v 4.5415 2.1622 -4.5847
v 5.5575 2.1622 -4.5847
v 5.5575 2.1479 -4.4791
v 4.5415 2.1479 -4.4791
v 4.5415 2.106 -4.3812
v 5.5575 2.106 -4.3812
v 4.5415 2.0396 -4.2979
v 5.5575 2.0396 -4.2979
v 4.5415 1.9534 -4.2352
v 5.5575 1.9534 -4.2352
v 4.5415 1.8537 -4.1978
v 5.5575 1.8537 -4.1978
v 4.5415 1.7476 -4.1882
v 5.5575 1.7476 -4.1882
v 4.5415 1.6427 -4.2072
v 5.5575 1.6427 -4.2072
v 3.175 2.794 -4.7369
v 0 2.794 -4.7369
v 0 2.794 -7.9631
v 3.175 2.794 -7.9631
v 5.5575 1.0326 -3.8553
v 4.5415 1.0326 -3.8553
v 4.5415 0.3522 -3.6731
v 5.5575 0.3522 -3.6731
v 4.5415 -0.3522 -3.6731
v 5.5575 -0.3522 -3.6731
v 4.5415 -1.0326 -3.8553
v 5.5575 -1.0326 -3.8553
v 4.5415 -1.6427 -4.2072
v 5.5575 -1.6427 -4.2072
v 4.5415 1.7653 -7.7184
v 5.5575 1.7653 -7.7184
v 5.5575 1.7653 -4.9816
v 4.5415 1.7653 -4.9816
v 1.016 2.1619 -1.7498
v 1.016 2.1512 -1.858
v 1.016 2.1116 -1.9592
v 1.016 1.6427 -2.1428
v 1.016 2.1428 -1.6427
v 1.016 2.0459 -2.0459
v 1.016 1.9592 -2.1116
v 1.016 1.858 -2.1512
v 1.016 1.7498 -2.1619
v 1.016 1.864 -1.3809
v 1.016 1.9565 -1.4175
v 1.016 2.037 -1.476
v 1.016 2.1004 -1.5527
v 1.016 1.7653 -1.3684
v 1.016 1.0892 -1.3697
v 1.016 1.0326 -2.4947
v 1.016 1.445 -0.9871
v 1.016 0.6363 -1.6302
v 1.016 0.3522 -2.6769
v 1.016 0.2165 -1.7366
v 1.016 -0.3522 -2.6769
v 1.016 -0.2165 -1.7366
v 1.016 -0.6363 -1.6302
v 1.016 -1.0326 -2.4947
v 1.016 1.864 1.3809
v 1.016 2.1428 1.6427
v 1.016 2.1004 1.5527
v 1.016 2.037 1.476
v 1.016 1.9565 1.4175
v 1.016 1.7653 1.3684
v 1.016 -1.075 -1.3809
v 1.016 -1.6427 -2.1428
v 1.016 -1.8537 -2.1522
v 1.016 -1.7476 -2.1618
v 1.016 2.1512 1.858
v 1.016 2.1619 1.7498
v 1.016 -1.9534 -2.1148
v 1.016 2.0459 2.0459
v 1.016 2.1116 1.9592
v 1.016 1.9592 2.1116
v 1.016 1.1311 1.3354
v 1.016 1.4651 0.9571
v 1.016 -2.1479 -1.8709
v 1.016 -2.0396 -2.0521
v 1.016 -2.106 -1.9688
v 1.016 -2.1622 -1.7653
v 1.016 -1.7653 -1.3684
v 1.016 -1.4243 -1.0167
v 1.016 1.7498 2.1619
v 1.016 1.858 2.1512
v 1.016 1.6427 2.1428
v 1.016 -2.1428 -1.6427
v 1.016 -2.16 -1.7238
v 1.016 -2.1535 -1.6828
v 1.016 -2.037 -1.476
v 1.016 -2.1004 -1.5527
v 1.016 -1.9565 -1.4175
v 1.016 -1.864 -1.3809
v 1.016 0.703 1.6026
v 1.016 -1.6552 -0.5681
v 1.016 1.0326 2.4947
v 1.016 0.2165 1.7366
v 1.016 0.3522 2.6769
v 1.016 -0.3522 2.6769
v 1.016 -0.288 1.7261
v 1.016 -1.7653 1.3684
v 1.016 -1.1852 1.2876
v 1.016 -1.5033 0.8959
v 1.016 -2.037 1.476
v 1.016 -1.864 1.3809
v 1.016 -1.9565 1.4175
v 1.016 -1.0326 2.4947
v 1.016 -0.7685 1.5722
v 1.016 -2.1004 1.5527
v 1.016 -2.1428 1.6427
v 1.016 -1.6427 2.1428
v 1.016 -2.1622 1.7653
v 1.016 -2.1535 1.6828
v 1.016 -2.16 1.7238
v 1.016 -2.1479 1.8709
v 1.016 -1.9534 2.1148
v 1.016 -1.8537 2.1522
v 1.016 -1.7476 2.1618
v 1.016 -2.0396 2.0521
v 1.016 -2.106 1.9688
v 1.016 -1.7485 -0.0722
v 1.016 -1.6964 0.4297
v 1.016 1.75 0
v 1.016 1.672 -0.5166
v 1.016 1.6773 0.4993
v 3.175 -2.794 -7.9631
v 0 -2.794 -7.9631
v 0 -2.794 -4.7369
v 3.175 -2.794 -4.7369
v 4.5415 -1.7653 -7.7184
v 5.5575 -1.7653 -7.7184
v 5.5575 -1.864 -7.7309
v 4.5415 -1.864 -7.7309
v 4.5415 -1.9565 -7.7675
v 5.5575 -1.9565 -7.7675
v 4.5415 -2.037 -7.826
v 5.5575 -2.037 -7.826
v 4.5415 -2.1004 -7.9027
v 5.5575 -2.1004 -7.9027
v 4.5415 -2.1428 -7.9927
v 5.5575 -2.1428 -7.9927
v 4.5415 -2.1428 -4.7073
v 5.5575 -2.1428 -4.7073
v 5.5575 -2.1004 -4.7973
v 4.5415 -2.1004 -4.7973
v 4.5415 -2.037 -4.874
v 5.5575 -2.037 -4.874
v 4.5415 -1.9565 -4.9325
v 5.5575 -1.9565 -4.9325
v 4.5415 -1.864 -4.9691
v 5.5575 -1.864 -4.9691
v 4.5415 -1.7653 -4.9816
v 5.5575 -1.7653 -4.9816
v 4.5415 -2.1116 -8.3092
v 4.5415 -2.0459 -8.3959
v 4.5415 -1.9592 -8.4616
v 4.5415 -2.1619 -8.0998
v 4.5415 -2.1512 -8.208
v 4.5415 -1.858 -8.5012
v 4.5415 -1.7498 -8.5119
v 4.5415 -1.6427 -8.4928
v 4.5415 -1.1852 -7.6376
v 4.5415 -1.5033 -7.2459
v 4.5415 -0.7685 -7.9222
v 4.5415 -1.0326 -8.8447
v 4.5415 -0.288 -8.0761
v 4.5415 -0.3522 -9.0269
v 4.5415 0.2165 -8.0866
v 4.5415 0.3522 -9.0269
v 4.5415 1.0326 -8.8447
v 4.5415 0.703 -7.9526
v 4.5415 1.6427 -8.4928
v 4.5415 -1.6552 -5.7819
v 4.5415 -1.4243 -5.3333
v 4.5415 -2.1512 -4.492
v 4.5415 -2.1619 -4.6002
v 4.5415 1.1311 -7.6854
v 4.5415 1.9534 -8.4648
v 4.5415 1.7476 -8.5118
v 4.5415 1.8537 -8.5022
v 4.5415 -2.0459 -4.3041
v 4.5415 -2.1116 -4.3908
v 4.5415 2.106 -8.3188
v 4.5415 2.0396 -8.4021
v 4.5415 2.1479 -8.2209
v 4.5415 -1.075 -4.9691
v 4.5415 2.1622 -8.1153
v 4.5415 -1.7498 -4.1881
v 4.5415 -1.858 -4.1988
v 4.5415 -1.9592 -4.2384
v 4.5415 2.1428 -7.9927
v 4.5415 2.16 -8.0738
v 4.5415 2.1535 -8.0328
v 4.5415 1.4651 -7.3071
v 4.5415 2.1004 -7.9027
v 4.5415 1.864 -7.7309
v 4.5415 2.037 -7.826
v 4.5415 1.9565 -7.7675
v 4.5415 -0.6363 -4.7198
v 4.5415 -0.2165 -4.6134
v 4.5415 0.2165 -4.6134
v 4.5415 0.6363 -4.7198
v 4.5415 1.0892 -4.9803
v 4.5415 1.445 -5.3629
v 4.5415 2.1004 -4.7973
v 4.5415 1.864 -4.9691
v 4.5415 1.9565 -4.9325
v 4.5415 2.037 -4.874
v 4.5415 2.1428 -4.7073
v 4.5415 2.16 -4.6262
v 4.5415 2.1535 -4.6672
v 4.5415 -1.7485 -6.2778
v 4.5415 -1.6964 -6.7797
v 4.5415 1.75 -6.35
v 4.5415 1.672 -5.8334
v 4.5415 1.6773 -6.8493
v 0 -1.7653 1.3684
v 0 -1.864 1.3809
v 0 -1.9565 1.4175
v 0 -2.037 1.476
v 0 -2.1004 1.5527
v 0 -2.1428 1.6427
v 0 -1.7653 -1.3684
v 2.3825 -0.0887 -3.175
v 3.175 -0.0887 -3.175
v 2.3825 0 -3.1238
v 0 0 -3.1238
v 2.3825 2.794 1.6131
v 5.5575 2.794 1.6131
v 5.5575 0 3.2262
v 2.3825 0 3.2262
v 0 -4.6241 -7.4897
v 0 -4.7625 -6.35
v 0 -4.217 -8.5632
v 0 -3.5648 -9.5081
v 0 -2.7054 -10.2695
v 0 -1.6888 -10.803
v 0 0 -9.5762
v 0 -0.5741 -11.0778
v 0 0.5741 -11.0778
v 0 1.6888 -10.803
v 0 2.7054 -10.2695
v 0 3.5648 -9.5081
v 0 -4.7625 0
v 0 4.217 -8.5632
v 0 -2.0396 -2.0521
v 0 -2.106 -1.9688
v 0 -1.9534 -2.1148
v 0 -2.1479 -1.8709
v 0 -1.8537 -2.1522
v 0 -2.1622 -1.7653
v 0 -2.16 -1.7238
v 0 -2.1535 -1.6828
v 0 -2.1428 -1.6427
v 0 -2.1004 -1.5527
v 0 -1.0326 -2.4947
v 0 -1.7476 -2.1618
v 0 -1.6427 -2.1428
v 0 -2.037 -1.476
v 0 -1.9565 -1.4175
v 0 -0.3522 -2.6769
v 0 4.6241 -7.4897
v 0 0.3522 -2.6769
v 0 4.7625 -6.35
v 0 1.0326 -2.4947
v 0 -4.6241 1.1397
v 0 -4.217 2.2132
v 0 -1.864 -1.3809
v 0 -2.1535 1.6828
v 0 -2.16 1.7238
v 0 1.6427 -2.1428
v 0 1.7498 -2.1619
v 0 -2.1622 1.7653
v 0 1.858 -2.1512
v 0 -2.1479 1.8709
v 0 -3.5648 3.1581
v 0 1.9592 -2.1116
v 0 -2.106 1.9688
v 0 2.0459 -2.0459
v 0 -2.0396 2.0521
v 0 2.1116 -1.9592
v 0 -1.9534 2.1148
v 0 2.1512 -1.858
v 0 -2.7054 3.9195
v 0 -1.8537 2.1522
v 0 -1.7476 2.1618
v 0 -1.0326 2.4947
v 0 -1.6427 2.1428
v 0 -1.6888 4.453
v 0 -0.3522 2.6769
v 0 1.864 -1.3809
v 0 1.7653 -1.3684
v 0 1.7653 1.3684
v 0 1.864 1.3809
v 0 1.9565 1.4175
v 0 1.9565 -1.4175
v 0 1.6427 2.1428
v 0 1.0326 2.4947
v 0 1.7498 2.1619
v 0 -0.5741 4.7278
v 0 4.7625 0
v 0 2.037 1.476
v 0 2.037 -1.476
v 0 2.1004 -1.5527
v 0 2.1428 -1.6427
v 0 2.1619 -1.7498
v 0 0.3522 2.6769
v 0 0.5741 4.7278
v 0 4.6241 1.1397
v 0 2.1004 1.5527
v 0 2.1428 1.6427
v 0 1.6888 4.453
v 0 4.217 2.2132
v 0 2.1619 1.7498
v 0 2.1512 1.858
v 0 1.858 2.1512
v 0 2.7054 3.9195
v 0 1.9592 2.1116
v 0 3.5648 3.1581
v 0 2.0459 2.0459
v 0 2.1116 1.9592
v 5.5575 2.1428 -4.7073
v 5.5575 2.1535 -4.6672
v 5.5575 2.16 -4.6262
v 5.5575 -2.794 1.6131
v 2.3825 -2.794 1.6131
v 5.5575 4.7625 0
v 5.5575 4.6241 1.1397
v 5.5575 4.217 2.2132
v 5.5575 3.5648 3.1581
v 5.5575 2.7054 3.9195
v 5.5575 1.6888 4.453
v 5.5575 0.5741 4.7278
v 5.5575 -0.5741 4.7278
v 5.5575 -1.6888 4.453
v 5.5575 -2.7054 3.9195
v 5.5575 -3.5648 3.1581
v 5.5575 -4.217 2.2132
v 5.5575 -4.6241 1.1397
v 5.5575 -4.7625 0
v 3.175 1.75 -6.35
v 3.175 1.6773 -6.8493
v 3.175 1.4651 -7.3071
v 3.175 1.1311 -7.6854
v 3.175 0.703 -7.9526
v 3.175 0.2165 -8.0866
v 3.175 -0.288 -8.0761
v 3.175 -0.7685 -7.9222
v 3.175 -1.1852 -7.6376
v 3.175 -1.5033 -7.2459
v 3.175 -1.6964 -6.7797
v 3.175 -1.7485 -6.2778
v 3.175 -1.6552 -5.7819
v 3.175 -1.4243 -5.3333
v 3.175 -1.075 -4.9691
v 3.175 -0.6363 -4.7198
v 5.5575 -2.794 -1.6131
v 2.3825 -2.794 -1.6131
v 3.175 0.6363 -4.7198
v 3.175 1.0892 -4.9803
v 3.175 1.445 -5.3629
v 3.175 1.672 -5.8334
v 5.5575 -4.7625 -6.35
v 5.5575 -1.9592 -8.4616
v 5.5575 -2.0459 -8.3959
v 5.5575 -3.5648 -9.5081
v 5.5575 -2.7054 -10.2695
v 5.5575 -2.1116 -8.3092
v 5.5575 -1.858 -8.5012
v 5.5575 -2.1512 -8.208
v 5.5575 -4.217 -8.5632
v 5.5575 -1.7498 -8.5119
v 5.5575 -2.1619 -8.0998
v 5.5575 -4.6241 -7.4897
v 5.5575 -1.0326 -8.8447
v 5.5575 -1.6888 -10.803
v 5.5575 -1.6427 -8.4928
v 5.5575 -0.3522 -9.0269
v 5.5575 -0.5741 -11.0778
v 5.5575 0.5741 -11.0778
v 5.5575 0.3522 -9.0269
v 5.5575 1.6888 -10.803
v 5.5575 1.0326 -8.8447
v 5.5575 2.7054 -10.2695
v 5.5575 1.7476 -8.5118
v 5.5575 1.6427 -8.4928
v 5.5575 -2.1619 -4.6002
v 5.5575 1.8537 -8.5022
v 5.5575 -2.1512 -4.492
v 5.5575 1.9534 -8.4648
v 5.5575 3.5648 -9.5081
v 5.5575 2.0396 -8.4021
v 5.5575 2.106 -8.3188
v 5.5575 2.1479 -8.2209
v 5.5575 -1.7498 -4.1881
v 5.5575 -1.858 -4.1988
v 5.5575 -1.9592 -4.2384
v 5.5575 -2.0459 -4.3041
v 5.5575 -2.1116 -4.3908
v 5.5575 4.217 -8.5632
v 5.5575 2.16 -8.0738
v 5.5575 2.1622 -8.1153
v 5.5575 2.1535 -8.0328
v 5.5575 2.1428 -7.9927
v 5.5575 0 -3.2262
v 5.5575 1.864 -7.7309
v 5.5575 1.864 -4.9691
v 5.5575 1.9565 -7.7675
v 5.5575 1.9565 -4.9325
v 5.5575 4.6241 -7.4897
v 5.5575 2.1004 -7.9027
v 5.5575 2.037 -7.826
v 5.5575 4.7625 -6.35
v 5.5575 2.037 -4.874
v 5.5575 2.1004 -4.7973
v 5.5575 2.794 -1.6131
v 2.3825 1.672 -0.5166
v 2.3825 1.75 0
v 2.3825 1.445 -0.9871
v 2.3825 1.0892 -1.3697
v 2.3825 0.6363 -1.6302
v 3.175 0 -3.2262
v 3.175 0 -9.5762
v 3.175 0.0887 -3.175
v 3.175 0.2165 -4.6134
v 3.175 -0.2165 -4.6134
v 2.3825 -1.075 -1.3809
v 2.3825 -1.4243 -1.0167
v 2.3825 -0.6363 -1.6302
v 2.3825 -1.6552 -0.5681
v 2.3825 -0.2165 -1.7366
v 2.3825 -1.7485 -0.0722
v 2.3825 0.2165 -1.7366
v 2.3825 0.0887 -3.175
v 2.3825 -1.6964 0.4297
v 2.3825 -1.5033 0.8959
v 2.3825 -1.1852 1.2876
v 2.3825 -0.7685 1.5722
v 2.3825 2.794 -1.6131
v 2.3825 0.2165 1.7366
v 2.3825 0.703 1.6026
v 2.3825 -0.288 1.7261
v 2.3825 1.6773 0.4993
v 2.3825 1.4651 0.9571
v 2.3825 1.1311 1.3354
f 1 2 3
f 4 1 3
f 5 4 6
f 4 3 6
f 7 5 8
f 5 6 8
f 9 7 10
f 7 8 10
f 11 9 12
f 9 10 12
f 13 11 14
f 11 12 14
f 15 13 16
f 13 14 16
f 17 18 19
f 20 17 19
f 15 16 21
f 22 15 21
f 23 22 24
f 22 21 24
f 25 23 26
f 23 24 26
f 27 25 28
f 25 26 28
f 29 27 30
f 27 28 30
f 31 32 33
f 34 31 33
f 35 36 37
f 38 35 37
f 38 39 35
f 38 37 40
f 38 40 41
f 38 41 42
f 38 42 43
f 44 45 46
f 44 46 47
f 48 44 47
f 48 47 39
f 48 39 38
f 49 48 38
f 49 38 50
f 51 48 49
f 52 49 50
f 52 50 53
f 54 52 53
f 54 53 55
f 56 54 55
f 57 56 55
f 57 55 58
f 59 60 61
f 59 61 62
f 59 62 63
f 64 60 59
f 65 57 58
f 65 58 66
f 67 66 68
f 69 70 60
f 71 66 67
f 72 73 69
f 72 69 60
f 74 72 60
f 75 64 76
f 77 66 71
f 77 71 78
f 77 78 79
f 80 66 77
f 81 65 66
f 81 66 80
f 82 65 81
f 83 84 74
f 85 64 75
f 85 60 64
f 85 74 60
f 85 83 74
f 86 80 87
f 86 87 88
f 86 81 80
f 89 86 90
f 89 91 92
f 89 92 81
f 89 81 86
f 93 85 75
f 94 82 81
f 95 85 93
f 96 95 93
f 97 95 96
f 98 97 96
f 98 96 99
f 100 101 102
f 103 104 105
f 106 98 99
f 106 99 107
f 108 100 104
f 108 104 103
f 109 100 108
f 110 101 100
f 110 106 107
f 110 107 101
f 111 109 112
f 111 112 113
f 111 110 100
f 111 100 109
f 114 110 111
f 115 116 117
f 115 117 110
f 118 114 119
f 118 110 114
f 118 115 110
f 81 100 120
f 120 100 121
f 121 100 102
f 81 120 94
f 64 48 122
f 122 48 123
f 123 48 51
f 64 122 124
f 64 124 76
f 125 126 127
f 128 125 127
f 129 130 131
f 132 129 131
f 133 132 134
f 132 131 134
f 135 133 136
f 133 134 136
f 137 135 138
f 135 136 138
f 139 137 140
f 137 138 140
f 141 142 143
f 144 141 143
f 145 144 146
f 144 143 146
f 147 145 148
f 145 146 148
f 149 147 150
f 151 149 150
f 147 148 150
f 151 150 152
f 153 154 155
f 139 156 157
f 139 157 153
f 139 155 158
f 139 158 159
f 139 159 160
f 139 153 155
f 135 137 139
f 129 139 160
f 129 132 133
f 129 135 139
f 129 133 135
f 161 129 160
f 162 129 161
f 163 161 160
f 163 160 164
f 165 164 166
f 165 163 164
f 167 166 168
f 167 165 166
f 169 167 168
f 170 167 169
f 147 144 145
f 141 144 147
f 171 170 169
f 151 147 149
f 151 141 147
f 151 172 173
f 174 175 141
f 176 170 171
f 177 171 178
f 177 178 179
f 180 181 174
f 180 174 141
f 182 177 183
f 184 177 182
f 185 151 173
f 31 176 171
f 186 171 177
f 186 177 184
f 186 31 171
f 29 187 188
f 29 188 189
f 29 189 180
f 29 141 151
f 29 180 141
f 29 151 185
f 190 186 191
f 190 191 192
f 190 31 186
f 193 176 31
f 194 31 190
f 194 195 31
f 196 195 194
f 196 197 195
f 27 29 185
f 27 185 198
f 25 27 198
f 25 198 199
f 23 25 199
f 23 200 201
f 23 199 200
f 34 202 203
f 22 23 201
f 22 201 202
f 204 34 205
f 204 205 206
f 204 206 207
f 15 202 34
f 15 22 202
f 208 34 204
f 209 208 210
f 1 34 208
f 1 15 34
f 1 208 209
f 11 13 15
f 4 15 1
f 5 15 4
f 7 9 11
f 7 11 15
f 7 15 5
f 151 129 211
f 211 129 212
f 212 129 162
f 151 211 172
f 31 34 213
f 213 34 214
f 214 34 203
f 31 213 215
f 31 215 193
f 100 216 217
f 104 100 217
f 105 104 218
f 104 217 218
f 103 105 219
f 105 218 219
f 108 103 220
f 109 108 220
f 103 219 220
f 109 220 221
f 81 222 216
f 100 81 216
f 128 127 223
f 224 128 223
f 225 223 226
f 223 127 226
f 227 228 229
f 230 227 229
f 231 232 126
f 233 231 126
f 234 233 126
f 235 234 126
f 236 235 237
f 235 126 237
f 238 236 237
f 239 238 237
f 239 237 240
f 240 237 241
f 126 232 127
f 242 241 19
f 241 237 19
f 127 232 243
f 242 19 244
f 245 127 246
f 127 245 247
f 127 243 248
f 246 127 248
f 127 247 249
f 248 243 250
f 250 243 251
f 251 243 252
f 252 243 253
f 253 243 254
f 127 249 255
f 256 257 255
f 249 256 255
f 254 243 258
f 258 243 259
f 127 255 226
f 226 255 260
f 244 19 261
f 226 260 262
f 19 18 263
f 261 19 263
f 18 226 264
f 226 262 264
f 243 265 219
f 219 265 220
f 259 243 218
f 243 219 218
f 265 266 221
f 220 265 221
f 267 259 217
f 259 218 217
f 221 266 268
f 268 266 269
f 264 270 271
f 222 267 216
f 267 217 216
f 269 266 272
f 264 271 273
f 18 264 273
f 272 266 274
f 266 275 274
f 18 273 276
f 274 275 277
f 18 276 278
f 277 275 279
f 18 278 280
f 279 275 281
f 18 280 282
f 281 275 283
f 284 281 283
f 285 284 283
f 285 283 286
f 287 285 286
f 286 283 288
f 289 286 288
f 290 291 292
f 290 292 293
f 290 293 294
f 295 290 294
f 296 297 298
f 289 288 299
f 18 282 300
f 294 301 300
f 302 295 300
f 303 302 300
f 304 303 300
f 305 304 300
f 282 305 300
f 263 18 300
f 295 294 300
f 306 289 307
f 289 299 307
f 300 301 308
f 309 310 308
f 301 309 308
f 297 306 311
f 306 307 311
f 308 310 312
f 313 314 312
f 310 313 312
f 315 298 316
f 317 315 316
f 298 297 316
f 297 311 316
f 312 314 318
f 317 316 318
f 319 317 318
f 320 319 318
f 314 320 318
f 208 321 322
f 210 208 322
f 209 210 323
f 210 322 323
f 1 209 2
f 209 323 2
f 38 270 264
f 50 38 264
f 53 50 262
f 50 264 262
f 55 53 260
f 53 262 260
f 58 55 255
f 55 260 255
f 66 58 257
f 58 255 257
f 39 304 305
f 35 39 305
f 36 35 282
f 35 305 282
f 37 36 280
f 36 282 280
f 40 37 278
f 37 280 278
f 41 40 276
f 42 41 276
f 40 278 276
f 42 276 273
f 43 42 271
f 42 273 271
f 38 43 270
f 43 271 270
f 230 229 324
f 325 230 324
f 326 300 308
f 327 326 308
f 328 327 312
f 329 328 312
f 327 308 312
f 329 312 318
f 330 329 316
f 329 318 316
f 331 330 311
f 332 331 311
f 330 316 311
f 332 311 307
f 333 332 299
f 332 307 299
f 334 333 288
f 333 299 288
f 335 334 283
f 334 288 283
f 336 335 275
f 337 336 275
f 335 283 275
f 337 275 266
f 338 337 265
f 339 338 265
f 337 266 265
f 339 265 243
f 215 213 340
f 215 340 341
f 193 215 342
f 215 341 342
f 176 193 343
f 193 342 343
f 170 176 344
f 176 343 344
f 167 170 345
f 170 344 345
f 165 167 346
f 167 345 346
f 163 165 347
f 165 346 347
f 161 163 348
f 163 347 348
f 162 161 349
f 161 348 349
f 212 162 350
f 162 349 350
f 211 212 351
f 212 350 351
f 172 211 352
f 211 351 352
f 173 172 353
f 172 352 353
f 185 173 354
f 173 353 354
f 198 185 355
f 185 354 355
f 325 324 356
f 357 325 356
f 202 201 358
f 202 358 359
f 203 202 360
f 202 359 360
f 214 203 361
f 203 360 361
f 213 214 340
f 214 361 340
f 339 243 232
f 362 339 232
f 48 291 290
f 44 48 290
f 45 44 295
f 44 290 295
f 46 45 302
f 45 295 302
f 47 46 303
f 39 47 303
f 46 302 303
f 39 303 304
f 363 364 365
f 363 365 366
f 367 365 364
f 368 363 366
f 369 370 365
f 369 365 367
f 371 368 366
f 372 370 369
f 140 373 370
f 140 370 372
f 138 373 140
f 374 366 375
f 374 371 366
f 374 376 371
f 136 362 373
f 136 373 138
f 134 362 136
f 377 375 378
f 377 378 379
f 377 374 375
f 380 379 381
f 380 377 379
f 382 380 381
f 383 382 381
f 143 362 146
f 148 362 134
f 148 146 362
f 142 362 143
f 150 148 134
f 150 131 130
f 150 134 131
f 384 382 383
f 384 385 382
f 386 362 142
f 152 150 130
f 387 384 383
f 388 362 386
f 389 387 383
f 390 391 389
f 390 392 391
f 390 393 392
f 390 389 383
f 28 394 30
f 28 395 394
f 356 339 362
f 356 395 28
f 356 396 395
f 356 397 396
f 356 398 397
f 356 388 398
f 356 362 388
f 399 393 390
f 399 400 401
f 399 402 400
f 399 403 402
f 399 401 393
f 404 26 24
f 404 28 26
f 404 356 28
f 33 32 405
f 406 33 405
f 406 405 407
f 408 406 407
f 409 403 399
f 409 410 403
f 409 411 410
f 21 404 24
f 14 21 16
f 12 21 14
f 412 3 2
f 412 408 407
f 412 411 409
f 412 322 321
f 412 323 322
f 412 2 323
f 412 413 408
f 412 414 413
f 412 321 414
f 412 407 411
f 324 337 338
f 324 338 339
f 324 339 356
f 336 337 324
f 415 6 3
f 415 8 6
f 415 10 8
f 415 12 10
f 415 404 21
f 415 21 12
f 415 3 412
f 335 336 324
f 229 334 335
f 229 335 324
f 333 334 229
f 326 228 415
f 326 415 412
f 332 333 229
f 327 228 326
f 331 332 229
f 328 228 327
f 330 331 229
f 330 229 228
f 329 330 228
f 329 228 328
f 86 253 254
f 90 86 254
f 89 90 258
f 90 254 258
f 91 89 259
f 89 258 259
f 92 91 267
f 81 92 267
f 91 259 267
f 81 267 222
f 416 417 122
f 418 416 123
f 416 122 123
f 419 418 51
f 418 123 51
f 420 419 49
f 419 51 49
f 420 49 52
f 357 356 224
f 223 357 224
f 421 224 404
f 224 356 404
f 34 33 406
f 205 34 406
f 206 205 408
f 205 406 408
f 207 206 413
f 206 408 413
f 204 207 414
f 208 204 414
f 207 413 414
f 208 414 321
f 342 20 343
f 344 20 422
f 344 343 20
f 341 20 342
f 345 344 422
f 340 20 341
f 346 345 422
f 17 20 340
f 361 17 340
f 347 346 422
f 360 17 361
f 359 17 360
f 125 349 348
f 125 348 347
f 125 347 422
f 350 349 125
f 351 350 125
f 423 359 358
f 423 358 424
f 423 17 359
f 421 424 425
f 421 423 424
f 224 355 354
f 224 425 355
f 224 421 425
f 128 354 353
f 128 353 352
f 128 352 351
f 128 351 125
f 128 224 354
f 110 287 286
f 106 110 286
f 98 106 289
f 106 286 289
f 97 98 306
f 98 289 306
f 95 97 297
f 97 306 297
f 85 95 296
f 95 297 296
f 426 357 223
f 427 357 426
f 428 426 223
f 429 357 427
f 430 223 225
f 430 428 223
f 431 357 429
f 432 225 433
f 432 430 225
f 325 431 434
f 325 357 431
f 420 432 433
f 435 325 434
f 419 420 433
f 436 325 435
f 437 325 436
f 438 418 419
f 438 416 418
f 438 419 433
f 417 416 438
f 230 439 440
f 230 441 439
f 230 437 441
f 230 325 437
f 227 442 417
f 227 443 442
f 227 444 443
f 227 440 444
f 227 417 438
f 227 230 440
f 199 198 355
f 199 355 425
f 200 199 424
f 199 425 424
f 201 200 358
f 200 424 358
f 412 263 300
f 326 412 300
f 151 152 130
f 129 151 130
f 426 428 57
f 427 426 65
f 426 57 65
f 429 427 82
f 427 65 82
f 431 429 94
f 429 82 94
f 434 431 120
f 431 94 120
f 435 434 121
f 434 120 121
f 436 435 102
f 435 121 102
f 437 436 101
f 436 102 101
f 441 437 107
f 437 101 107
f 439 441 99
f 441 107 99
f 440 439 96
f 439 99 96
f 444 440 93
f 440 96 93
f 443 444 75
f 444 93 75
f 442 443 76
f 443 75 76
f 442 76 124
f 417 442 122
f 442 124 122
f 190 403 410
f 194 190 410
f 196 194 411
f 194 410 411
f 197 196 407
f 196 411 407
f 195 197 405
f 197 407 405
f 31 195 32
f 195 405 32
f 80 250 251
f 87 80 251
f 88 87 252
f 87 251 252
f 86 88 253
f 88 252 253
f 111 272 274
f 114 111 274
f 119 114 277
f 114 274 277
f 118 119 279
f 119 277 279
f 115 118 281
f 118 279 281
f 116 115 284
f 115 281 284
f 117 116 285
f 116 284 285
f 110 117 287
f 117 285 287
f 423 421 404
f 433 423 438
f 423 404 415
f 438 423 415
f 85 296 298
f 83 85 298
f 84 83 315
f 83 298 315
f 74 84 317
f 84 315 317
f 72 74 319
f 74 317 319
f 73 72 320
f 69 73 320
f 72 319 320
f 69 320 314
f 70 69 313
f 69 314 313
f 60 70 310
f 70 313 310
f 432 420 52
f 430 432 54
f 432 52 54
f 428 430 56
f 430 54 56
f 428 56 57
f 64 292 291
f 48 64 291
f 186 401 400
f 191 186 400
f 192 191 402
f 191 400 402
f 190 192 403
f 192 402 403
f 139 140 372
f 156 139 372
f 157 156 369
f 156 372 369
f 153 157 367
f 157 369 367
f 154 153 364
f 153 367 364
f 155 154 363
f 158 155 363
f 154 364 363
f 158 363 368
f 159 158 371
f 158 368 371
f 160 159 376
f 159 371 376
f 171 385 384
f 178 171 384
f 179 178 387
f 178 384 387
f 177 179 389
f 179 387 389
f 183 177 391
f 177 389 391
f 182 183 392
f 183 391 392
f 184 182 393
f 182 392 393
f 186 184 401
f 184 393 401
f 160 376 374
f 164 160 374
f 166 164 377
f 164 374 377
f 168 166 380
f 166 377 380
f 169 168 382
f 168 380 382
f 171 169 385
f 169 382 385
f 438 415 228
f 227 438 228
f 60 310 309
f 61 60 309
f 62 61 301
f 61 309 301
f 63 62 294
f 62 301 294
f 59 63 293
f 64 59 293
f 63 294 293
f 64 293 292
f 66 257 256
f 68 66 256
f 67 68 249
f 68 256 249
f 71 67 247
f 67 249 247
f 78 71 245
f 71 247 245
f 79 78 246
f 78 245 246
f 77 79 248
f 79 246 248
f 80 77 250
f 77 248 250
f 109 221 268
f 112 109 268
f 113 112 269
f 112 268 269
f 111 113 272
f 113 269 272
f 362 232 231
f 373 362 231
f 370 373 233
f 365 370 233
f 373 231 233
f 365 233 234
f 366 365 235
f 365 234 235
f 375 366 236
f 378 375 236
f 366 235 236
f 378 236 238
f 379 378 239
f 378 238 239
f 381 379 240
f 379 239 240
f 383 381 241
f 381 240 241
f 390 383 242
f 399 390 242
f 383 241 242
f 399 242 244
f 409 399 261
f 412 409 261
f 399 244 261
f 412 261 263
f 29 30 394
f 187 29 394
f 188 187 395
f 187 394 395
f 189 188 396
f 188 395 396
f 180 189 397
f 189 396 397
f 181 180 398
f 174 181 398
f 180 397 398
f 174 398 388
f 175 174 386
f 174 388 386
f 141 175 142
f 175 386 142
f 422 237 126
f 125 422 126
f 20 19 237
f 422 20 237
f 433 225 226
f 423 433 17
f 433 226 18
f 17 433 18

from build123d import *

# Parameters (mm, degrees)
F1_DEPTH = 5.55752
F2_R     = 1.75
F3_DEPTH = 1.016
F4_R     = 1.75
F5_DEPTH = 1.016
F6_DEPTH = 3.175
F7_DEPTH = 3.175


# Not quite as in the source:
# - a feature names something its author has since deleted; it is built from what else it names


with BuildPart() as f1:
    # F0 (on Right) → F1 (new body)
    with BuildSketch(Plane.YZ):
        with BuildLine():
            ThreePointArc((0.636344373, -4.7197957677), (2.2310225415, -4.2076055743), (3.5497579143, -3.175))
            ThreePointArc((3.5497579143, -3.175), (2.2310225415, -2.1423944257), (0.636344373, -1.6302042323))
            ThreePointArc((0.636344373, -1.6302042323), (0, -1.75), (-0.636344373, -1.6302042323))
            ThreePointArc((-0.636344373, -1.6302042323), (-2.2310225415, -2.1423944257), (-3.5497579143, -3.175))
            ThreePointArc((-3.5497579143, -3.175), (-2.2310225415, -4.2076055743), (-0.636344373, -4.7197957677))
            ThreePointArc((-0.636344373, -4.7197957677), (0, -4.6), (0.636344373, -4.7197957677))
        make_face()
        with BuildLine():
            ThreePointArc((3.5497579143, -3.175), (4.4489958596, -1.6993652025), (4.7625, 0))
            ThreePointArc((4.7625, 0), (0, 4.7625), (-4.7625, 0))
            ThreePointArc((-4.7625, 0), (-4.4489958596, -1.6993652025), (-3.5497579143, -3.175))
            ThreePointArc((-3.5497579143, -3.175), (-2.2310225415, -2.1423944257), (-0.636344373, -1.6302042323))
            ThreePointArc((-0.636344373, -1.6302042323), (-0.9871416685, 1.4450091094), (1.75, 0))
            ThreePointArc((1.75, 0), (1.4450091094, -0.9871416685), (0.636344373, -1.6302042323))
            ThreePointArc((0.636344373, -1.6302042323), (2.2310225415, -2.1423944257), (3.5497579143, -3.175))
        make_face()
        with BuildLine():
            Line((4.7625, -6.35), (4.7625, 0))
            ThreePointArc((4.7625, 0), (4.4489958596, -1.6993652025), (3.5497579143, -3.175))
            ThreePointArc((3.5497579143, -3.175), (4.4489958596, -4.6506347975), (4.7625, -6.35))
        make_face()
        with BuildLine():
            ThreePointArc((4.7625, -6.35), (4.4489958596, -4.6506347975), (3.5497579143, -3.175))
            ThreePointArc((3.5497579143, -3.175), (2.2310225415, -4.2076055743), (0.636344373, -4.7197957677))
            ThreePointArc((0.636344373, -4.7197957677), (1.4450091094, -5.3628583315), (1.75, -6.35))
            ThreePointArc((1.75, -6.35), (-0.9871416685, -7.7950091094), (-0.636344373, -4.7197957677))
            ThreePointArc((-0.636344373, -4.7197957677), (-2.2310225415, -4.2076055743), (-3.5497579143, -3.175))
            ThreePointArc((-3.5497579143, -3.175), (-4.4489958596, -4.6506347975), (-4.7625, -6.35))
            ThreePointArc((-4.7625, -6.35), (0, -11.1125), (4.7625, -6.35))
        make_face()
        with BuildLine():
            ThreePointArc((-3.5497579143, -3.175), (-4.4489958596, -1.6993652025), (-4.7625, 0))
            Line((-4.7625, 0), (-4.7625, -6.35))
            ThreePointArc((-4.7625, -6.35), (-4.4489958596, -4.6506347975), (-3.5497579143, -3.175))
        make_face()
    extrude(amount=F1_DEPTH)

    # F2 (on face) → F3 (cut)
    with BuildSketch(Plane.YZ.offset(5.55752)):
        with BuildLine():
            ThreePointArc((1.368425, -4.5847), (1.4846669962, -4.8653330038), (1.7653, -4.981575))
            Line((1.7653, -4.981575), (1.7653, -4.5847))
            Line((1.7653, -4.5847), (1.368425, -4.5847))
        make_face()
        with BuildLine():
            Line((1.7653, -4.5847), (1.7653, -4.981575))
            ThreePointArc((1.7653, -4.981575), (1.9986038099, -4.9057593371), (2.1427708235, -4.7072787218))
            ThreePointArc((2.1427708235, -4.7072787218), (1.9091883092, -4.4408116908), (1.6427212782, -4.2072291765))
            ThreePointArc((1.6427212782, -4.2072291765), (1.4442406629, -4.3513961901), (1.368425, -4.5847))
            Line((1.368425, -4.5847), (1.7653, -4.5847))
        make_face()
        with BuildLine():
            ThreePointArc((1.7653, -7.718425), (1.4846669962, -7.8346669962), (1.368425, -8.1153))
            Line((1.368425, -8.1153), (1.7653, -8.1153))
            Line((1.7653, -8.1153), (1.7653, -7.718425))
        make_face()
        with BuildLine():
            Line((1.7653, -8.1153), (1.368425, -8.1153))
            ThreePointArc((1.368425, -8.1153), (1.4442406629, -8.3486038099), (1.6427212782, -8.4927708235))
            ThreePointArc((1.6427212782, -8.4927708235), (1.9091883092, -8.2591883092), (2.1427708235, -7.9927212782))
            ThreePointArc((2.1427708235, -7.9927212782), (1.9986038099, -7.7942406629), (1.7653, -7.718425))
            Line((1.7653, -7.718425), (1.7653, -8.1153))
        make_face()
        with BuildLine():
            Line((-1.368425, -8.1153), (-1.7653, -8.1153))
            Line((-1.7653, -8.1153), (-1.7653, -7.718425))
            ThreePointArc((-1.7653, -7.718425), (-1.9986038099, -7.7942406629), (-2.1427708235, -7.9927212782))
            ThreePointArc((-2.1427708235, -7.9927212782), (-1.9091883092, -8.2591883092), (-1.6427212782, -8.4927708235))
            ThreePointArc((-1.6427212782, -8.4927708235), (-1.4442406629, -8.3486038099), (-1.368425, -8.1153))
        make_face()
        with BuildLine():
            Line((-1.7653, -7.718425), (-1.7653, -8.1153))
            Line((-1.7653, -8.1153), (-1.368425, -8.1153))
            ThreePointArc((-1.368425, -8.1153), (-1.4846669962, -7.8346669962), (-1.7653, -7.718425))
        make_face()
        with BuildLine():
            Line((-1.7653, -4.5847), (-1.7653, -4.981575))
            ThreePointArc((-1.7653, -4.981575), (-1.4846669962, -4.8653330038), (-1.368425, -4.5847))
            Line((-1.368425, -4.5847), (-1.7653, -4.5847))
        make_face()
        with BuildLine():
            ThreePointArc((-2.1427708235, -4.7072787218), (-1.9986038099, -4.9057593371), (-1.7653, -4.981575))
            Line((-1.7653, -4.981575), (-1.7653, -4.5847))
            Line((-1.7653, -4.5847), (-1.368425, -4.5847))
            ThreePointArc((-1.368425, -4.5847), (-1.4442406629, -4.3513961901), (-1.6427212782, -4.2072291765))
            ThreePointArc((-1.6427212782, -4.2072291765), (-1.9091883092, -4.4408116908), (-2.1427708235, -4.7072787218))
        make_face()
        with BuildLine():
            ThreePointArc((-1.7653, -7.718425), (-1.4846669962, -7.8346669962), (-1.368425, -8.1153))
            Line((-1.368425, -8.1153), (1.368425, -8.1153))
            ThreePointArc((1.368425, -8.1153), (1.4846669962, -7.8346669962), (1.7653, -7.718425))
            Line((1.7653, -7.718425), (1.7653, -4.981575))
            ThreePointArc((1.7653, -4.981575), (1.4846669962, -4.8653330038), (1.368425, -4.5847))
            Line((1.368425, -4.5847), (-1.368425, -4.5847))
            ThreePointArc((-1.368425, -4.5847), (-1.4846669962, -4.8653330038), (-1.7653, -4.981575))
            Line((-1.7653, -4.981575), (-1.7653, -7.718425))
        make_face()
        with Locations((0, -6.35)):
            Circle(F2_R, mode=Mode.SUBTRACT)
        with BuildLine():
            ThreePointArc((-1.6427212782, -4.2072291765), (-2.0459330038, -4.3040669962), (-2.1427708235, -4.7072787218))
            ThreePointArc((-2.1427708235, -4.7072787218), (-1.9091883092, -4.4408116908), (-1.6427212782, -4.2072291765))
        make_face()
        with BuildLine():
            ThreePointArc((1.6427212782, -4.2072291765), (1.9091883092, -4.4408116908), (2.1427708235, -4.7072787218))
            ThreePointArc((2.1427708235, -4.7072787218), (2.1572939405, -4.6467525283), (2.162175, -4.5847))
            ThreePointArc((2.162175, -4.5847), (1.9986038099, -4.2636406629), (1.6427212782, -4.2072291765))
        make_face()
        with BuildLine():
            ThreePointArc((2.1427708235, -7.9927212782), (1.9091883092, -8.2591883092), (1.6427212782, -8.4927708235))
            ThreePointArc((1.6427212782, -8.4927708235), (1.9986038099, -8.4363593371), (2.162175, -8.1153))
            ThreePointArc((2.162175, -8.1153), (2.1572939405, -8.0532474717), (2.1427708235, -7.9927212782))
        make_face()
        with BuildLine():
            ThreePointArc((-2.1427708235, -7.9927212782), (-2.0459330038, -8.3959330038), (-1.6427212782, -8.4927708235))
            ThreePointArc((-1.6427212782, -8.4927708235), (-1.9091883092, -8.2591883092), (-2.1427708235, -7.9927212782))
        make_face()
        with BuildLine():
            ThreePointArc((-1.6427212782, -4.2072291765), (-1.4442406629, -4.3513961901), (-1.368425, -4.5847))
            Line((-1.368425, -4.5847), (1.368425, -4.5847))
            ThreePointArc((1.368425, -4.5847), (1.4442406629, -4.3513961901), (1.6427212782, -4.2072291765))
            ThreePointArc((1.6427212782, -4.2072291765), (0, -3.65), (-1.6427212782, -4.2072291765))
        make_face()
        with BuildLine():
            Line((1.368425, -8.1153), (-1.368425, -8.1153))
            ThreePointArc((-1.368425, -8.1153), (-1.4442406629, -8.3486038099), (-1.6427212782, -8.4927708235))
            ThreePointArc((-1.6427212782, -8.4927708235), (0, -9.05), (1.6427212782, -8.4927708235))
            ThreePointArc((1.6427212782, -8.4927708235), (1.4442406629, -8.3486038099), (1.368425, -8.1153))
        make_face()
    extrude(amount=-F3_DEPTH, mode=Mode.SUBTRACT)

    # F4 (on face) → F5 (cut)
    with BuildSketch(Plane(origin=(0, 0, 0), x_dir=(0, -1, 0), z_dir=(-1, 0, 0))):
        with BuildLine():
            ThreePointArc((1.7653, -1.368425), (1.4846669962, -1.4846669962), (1.368425, -1.7653))
            Line((1.368425, -1.7653), (1.7653, -1.7653))
            Line((1.7653, -1.7653), (1.7653, -1.368425))
        make_face()
        with BuildLine():
            Line((1.7653, -1.7653), (1.368425, -1.7653))
            ThreePointArc((1.368425, -1.7653), (1.4442406629, -1.9986038099), (1.6427212782, -2.1427708235))
            ThreePointArc((1.6427212782, -2.1427708235), (1.9091883092, -1.9091883092), (2.1427708235, -1.6427212782))
            ThreePointArc((2.1427708235, -1.6427212782), (1.9986038099, -1.4442406629), (1.7653, -1.368425))
            Line((1.7653, -1.368425), (1.7653, -1.7653))
        make_face()
        with BuildLine():
            Line((-1.7653, -1.368425), (-1.7653, -1.7653))
            Line((-1.7653, -1.7653), (-1.368425, -1.7653))
            ThreePointArc((-1.368425, -1.7653), (-1.4846669962, -1.4846669962), (-1.7653, -1.368425))
        make_face()
        with BuildLine():
            Line((-1.368425, -1.7653), (-1.7653, -1.7653))
            Line((-1.7653, -1.7653), (-1.7653, -1.368425))
            ThreePointArc((-1.7653, -1.368425), (-1.9986038099, -1.4442406629), (-2.1427708235, -1.6427212782))
            ThreePointArc((-2.1427708235, -1.6427212782), (-1.9091883092, -1.9091883092), (-1.6427212782, -2.1427708235))
            ThreePointArc((-1.6427212782, -2.1427708235), (-1.4442406629, -1.9986038099), (-1.368425, -1.7653))
        make_face()
        with BuildLine():
            Line((-1.7653, 1.7653), (-1.7653, 1.368425))
            ThreePointArc((-1.7653, 1.368425), (-1.4846669962, 1.4846669962), (-1.368425, 1.7653))
            Line((-1.368425, 1.7653), (-1.7653, 1.7653))
        make_face()
        with BuildLine():
            ThreePointArc((-2.1427708235, 1.6427212782), (-1.9986038099, 1.4442406629), (-1.7653, 1.368425))
            Line((-1.7653, 1.368425), (-1.7653, 1.7653))
            Line((-1.7653, 1.7653), (-1.368425, 1.7653))
            ThreePointArc((-1.368425, 1.7653), (-1.4442406629, 1.9986038099), (-1.6427212782, 2.1427708235))
            ThreePointArc((-1.6427212782, 2.1427708235), (-1.9091883092, 1.9091883092), (-2.1427708235, 1.6427212782))
        make_face()
        with BuildLine():
            ThreePointArc((1.368425, 1.7653), (1.4846669962, 1.4846669962), (1.7653, 1.368425))
            Line((1.7653, 1.368425), (1.7653, 1.7653))
            Line((1.7653, 1.7653), (1.368425, 1.7653))
        make_face()
        with BuildLine():
            Line((1.7653, 1.7653), (1.7653, 1.368425))
            ThreePointArc((1.7653, 1.368425), (1.9986038099, 1.4442406629), (2.1427708235, 1.6427212782))
            ThreePointArc((2.1427708235, 1.6427212782), (1.9091883092, 1.9091883092), (1.6427212782, 2.1427708235))
            ThreePointArc((1.6427212782, 2.1427708235), (1.4442406629, 1.9986038099), (1.368425, 1.7653))
            Line((1.368425, 1.7653), (1.7653, 1.7653))
        make_face()
        with BuildLine():
            ThreePointArc((-1.7653, -1.368425), (-1.4846669962, -1.4846669962), (-1.368425, -1.7653))
            Line((-1.368425, -1.7653), (1.368425, -1.7653))
            ThreePointArc((1.368425, -1.7653), (1.4846669962, -1.4846669962), (1.7653, -1.368425))
            Line((1.7653, -1.368425), (1.7653, 1.368425))
            ThreePointArc((1.7653, 1.368425), (1.4846669962, 1.4846669962), (1.368425, 1.7653))
            Line((1.368425, 1.7653), (-1.368425, 1.7653))
            ThreePointArc((-1.368425, 1.7653), (-1.4846669962, 1.4846669962), (-1.7653, 1.368425))
            Line((-1.7653, 1.368425), (-1.7653, -1.368425))
        make_face()
        Circle(F4_R, mode=Mode.SUBTRACT)
        with BuildLine():
            ThreePointArc((-1.6427212782, 2.1427708235), (-2.0459330038, 2.0459330038), (-2.1427708235, 1.6427212782))
            ThreePointArc((-2.1427708235, 1.6427212782), (-1.9091883092, 1.9091883092), (-1.6427212782, 2.1427708235))
        make_face()
        with BuildLine():
            ThreePointArc((1.6427212782, 2.1427708235), (1.9091883092, 1.9091883092), (2.1427708235, 1.6427212782))
            ThreePointArc((2.1427708235, 1.6427212782), (2.1572939405, 1.7032474717), (2.162175, 1.7653))
            ThreePointArc((2.162175, 1.7653), (1.9986038099, 2.0863593371), (1.6427212782, 2.1427708235))
        make_face()
        with BuildLine():
            ThreePointArc((2.1427708235, -1.6427212782), (1.9091883092, -1.9091883092), (1.6427212782, -2.1427708235))
            ThreePointArc((1.6427212782, -2.1427708235), (1.9986038099, -2.0863593371), (2.162175, -1.7653))
            ThreePointArc((2.162175, -1.7653), (2.1572939405, -1.7032474717), (2.1427708235, -1.6427212782))
        make_face()
        with BuildLine():
            ThreePointArc((-2.1427708235, -1.6427212782), (-2.0459330038, -2.0459330038), (-1.6427212782, -2.1427708235))
            ThreePointArc((-1.6427212782, -2.1427708235), (-1.9091883092, -1.9091883092), (-2.1427708235, -1.6427212782))
        make_face()
        with BuildLine():
            ThreePointArc((-1.6427212782, 2.1427708235), (-1.4442406629, 1.9986038099), (-1.368425, 1.7653))
            Line((-1.368425, 1.7653), (1.368425, 1.7653))
            ThreePointArc((1.368425, 1.7653), (1.4442406629, 1.9986038099), (1.6427212782, 2.1427708235))
            ThreePointArc((1.6427212782, 2.1427708235), (0, 2.7), (-1.6427212782, 2.1427708235))
        make_face()
        with BuildLine():
            Line((1.368425, -1.7653), (-1.368425, -1.7653))
            ThreePointArc((-1.368425, -1.7653), (-1.4442406629, -1.9986038099), (-1.6427212782, -2.1427708235))
            ThreePointArc((-1.6427212782, -2.1427708235), (0, -2.7), (1.6427212782, -2.1427708235))
            ThreePointArc((1.6427212782, -2.1427708235), (1.4442406629, -1.9986038099), (1.368425, -1.7653))
        make_face()
    extrude(amount=-F5_DEPTH, mode=Mode.SUBTRACT)

    # F2 (on face) → F6 (cut)
    with BuildSketch(Plane.YZ.offset(5.55752)):
        Polygon((-2.794, -1.6131166521), (0, -3.2262333042), (2.794, -1.6131166521), (2.794, 1.6131166521), (0, 3.2262333042), (-2.794, 1.6131166521), align=None)
        Circle(F2_R, mode=Mode.SUBTRACT)
    extrude(amount=-F6_DEPTH, mode=Mode.SUBTRACT)

    # F4 (on face) → F7 (cut)
    with BuildSketch(Plane(origin=(0, 0, 0), x_dir=(0, -1, 0), z_dir=(-1, 0, 0))):
        Polygon((-2.794, -7.9631166521), (0, -9.5762333042), (2.794, -7.9631166521), (2.794, -4.7368833479), (0, -3.1237666958), (-2.794, -4.7368833479), align=None)
        with Locations((0, -6.35)):
            Circle(F4_R, mode=Mode.SUBTRACT)
    extrude(amount=-F7_DEPTH, mode=Mode.SUBTRACT)


solid = f1.part
